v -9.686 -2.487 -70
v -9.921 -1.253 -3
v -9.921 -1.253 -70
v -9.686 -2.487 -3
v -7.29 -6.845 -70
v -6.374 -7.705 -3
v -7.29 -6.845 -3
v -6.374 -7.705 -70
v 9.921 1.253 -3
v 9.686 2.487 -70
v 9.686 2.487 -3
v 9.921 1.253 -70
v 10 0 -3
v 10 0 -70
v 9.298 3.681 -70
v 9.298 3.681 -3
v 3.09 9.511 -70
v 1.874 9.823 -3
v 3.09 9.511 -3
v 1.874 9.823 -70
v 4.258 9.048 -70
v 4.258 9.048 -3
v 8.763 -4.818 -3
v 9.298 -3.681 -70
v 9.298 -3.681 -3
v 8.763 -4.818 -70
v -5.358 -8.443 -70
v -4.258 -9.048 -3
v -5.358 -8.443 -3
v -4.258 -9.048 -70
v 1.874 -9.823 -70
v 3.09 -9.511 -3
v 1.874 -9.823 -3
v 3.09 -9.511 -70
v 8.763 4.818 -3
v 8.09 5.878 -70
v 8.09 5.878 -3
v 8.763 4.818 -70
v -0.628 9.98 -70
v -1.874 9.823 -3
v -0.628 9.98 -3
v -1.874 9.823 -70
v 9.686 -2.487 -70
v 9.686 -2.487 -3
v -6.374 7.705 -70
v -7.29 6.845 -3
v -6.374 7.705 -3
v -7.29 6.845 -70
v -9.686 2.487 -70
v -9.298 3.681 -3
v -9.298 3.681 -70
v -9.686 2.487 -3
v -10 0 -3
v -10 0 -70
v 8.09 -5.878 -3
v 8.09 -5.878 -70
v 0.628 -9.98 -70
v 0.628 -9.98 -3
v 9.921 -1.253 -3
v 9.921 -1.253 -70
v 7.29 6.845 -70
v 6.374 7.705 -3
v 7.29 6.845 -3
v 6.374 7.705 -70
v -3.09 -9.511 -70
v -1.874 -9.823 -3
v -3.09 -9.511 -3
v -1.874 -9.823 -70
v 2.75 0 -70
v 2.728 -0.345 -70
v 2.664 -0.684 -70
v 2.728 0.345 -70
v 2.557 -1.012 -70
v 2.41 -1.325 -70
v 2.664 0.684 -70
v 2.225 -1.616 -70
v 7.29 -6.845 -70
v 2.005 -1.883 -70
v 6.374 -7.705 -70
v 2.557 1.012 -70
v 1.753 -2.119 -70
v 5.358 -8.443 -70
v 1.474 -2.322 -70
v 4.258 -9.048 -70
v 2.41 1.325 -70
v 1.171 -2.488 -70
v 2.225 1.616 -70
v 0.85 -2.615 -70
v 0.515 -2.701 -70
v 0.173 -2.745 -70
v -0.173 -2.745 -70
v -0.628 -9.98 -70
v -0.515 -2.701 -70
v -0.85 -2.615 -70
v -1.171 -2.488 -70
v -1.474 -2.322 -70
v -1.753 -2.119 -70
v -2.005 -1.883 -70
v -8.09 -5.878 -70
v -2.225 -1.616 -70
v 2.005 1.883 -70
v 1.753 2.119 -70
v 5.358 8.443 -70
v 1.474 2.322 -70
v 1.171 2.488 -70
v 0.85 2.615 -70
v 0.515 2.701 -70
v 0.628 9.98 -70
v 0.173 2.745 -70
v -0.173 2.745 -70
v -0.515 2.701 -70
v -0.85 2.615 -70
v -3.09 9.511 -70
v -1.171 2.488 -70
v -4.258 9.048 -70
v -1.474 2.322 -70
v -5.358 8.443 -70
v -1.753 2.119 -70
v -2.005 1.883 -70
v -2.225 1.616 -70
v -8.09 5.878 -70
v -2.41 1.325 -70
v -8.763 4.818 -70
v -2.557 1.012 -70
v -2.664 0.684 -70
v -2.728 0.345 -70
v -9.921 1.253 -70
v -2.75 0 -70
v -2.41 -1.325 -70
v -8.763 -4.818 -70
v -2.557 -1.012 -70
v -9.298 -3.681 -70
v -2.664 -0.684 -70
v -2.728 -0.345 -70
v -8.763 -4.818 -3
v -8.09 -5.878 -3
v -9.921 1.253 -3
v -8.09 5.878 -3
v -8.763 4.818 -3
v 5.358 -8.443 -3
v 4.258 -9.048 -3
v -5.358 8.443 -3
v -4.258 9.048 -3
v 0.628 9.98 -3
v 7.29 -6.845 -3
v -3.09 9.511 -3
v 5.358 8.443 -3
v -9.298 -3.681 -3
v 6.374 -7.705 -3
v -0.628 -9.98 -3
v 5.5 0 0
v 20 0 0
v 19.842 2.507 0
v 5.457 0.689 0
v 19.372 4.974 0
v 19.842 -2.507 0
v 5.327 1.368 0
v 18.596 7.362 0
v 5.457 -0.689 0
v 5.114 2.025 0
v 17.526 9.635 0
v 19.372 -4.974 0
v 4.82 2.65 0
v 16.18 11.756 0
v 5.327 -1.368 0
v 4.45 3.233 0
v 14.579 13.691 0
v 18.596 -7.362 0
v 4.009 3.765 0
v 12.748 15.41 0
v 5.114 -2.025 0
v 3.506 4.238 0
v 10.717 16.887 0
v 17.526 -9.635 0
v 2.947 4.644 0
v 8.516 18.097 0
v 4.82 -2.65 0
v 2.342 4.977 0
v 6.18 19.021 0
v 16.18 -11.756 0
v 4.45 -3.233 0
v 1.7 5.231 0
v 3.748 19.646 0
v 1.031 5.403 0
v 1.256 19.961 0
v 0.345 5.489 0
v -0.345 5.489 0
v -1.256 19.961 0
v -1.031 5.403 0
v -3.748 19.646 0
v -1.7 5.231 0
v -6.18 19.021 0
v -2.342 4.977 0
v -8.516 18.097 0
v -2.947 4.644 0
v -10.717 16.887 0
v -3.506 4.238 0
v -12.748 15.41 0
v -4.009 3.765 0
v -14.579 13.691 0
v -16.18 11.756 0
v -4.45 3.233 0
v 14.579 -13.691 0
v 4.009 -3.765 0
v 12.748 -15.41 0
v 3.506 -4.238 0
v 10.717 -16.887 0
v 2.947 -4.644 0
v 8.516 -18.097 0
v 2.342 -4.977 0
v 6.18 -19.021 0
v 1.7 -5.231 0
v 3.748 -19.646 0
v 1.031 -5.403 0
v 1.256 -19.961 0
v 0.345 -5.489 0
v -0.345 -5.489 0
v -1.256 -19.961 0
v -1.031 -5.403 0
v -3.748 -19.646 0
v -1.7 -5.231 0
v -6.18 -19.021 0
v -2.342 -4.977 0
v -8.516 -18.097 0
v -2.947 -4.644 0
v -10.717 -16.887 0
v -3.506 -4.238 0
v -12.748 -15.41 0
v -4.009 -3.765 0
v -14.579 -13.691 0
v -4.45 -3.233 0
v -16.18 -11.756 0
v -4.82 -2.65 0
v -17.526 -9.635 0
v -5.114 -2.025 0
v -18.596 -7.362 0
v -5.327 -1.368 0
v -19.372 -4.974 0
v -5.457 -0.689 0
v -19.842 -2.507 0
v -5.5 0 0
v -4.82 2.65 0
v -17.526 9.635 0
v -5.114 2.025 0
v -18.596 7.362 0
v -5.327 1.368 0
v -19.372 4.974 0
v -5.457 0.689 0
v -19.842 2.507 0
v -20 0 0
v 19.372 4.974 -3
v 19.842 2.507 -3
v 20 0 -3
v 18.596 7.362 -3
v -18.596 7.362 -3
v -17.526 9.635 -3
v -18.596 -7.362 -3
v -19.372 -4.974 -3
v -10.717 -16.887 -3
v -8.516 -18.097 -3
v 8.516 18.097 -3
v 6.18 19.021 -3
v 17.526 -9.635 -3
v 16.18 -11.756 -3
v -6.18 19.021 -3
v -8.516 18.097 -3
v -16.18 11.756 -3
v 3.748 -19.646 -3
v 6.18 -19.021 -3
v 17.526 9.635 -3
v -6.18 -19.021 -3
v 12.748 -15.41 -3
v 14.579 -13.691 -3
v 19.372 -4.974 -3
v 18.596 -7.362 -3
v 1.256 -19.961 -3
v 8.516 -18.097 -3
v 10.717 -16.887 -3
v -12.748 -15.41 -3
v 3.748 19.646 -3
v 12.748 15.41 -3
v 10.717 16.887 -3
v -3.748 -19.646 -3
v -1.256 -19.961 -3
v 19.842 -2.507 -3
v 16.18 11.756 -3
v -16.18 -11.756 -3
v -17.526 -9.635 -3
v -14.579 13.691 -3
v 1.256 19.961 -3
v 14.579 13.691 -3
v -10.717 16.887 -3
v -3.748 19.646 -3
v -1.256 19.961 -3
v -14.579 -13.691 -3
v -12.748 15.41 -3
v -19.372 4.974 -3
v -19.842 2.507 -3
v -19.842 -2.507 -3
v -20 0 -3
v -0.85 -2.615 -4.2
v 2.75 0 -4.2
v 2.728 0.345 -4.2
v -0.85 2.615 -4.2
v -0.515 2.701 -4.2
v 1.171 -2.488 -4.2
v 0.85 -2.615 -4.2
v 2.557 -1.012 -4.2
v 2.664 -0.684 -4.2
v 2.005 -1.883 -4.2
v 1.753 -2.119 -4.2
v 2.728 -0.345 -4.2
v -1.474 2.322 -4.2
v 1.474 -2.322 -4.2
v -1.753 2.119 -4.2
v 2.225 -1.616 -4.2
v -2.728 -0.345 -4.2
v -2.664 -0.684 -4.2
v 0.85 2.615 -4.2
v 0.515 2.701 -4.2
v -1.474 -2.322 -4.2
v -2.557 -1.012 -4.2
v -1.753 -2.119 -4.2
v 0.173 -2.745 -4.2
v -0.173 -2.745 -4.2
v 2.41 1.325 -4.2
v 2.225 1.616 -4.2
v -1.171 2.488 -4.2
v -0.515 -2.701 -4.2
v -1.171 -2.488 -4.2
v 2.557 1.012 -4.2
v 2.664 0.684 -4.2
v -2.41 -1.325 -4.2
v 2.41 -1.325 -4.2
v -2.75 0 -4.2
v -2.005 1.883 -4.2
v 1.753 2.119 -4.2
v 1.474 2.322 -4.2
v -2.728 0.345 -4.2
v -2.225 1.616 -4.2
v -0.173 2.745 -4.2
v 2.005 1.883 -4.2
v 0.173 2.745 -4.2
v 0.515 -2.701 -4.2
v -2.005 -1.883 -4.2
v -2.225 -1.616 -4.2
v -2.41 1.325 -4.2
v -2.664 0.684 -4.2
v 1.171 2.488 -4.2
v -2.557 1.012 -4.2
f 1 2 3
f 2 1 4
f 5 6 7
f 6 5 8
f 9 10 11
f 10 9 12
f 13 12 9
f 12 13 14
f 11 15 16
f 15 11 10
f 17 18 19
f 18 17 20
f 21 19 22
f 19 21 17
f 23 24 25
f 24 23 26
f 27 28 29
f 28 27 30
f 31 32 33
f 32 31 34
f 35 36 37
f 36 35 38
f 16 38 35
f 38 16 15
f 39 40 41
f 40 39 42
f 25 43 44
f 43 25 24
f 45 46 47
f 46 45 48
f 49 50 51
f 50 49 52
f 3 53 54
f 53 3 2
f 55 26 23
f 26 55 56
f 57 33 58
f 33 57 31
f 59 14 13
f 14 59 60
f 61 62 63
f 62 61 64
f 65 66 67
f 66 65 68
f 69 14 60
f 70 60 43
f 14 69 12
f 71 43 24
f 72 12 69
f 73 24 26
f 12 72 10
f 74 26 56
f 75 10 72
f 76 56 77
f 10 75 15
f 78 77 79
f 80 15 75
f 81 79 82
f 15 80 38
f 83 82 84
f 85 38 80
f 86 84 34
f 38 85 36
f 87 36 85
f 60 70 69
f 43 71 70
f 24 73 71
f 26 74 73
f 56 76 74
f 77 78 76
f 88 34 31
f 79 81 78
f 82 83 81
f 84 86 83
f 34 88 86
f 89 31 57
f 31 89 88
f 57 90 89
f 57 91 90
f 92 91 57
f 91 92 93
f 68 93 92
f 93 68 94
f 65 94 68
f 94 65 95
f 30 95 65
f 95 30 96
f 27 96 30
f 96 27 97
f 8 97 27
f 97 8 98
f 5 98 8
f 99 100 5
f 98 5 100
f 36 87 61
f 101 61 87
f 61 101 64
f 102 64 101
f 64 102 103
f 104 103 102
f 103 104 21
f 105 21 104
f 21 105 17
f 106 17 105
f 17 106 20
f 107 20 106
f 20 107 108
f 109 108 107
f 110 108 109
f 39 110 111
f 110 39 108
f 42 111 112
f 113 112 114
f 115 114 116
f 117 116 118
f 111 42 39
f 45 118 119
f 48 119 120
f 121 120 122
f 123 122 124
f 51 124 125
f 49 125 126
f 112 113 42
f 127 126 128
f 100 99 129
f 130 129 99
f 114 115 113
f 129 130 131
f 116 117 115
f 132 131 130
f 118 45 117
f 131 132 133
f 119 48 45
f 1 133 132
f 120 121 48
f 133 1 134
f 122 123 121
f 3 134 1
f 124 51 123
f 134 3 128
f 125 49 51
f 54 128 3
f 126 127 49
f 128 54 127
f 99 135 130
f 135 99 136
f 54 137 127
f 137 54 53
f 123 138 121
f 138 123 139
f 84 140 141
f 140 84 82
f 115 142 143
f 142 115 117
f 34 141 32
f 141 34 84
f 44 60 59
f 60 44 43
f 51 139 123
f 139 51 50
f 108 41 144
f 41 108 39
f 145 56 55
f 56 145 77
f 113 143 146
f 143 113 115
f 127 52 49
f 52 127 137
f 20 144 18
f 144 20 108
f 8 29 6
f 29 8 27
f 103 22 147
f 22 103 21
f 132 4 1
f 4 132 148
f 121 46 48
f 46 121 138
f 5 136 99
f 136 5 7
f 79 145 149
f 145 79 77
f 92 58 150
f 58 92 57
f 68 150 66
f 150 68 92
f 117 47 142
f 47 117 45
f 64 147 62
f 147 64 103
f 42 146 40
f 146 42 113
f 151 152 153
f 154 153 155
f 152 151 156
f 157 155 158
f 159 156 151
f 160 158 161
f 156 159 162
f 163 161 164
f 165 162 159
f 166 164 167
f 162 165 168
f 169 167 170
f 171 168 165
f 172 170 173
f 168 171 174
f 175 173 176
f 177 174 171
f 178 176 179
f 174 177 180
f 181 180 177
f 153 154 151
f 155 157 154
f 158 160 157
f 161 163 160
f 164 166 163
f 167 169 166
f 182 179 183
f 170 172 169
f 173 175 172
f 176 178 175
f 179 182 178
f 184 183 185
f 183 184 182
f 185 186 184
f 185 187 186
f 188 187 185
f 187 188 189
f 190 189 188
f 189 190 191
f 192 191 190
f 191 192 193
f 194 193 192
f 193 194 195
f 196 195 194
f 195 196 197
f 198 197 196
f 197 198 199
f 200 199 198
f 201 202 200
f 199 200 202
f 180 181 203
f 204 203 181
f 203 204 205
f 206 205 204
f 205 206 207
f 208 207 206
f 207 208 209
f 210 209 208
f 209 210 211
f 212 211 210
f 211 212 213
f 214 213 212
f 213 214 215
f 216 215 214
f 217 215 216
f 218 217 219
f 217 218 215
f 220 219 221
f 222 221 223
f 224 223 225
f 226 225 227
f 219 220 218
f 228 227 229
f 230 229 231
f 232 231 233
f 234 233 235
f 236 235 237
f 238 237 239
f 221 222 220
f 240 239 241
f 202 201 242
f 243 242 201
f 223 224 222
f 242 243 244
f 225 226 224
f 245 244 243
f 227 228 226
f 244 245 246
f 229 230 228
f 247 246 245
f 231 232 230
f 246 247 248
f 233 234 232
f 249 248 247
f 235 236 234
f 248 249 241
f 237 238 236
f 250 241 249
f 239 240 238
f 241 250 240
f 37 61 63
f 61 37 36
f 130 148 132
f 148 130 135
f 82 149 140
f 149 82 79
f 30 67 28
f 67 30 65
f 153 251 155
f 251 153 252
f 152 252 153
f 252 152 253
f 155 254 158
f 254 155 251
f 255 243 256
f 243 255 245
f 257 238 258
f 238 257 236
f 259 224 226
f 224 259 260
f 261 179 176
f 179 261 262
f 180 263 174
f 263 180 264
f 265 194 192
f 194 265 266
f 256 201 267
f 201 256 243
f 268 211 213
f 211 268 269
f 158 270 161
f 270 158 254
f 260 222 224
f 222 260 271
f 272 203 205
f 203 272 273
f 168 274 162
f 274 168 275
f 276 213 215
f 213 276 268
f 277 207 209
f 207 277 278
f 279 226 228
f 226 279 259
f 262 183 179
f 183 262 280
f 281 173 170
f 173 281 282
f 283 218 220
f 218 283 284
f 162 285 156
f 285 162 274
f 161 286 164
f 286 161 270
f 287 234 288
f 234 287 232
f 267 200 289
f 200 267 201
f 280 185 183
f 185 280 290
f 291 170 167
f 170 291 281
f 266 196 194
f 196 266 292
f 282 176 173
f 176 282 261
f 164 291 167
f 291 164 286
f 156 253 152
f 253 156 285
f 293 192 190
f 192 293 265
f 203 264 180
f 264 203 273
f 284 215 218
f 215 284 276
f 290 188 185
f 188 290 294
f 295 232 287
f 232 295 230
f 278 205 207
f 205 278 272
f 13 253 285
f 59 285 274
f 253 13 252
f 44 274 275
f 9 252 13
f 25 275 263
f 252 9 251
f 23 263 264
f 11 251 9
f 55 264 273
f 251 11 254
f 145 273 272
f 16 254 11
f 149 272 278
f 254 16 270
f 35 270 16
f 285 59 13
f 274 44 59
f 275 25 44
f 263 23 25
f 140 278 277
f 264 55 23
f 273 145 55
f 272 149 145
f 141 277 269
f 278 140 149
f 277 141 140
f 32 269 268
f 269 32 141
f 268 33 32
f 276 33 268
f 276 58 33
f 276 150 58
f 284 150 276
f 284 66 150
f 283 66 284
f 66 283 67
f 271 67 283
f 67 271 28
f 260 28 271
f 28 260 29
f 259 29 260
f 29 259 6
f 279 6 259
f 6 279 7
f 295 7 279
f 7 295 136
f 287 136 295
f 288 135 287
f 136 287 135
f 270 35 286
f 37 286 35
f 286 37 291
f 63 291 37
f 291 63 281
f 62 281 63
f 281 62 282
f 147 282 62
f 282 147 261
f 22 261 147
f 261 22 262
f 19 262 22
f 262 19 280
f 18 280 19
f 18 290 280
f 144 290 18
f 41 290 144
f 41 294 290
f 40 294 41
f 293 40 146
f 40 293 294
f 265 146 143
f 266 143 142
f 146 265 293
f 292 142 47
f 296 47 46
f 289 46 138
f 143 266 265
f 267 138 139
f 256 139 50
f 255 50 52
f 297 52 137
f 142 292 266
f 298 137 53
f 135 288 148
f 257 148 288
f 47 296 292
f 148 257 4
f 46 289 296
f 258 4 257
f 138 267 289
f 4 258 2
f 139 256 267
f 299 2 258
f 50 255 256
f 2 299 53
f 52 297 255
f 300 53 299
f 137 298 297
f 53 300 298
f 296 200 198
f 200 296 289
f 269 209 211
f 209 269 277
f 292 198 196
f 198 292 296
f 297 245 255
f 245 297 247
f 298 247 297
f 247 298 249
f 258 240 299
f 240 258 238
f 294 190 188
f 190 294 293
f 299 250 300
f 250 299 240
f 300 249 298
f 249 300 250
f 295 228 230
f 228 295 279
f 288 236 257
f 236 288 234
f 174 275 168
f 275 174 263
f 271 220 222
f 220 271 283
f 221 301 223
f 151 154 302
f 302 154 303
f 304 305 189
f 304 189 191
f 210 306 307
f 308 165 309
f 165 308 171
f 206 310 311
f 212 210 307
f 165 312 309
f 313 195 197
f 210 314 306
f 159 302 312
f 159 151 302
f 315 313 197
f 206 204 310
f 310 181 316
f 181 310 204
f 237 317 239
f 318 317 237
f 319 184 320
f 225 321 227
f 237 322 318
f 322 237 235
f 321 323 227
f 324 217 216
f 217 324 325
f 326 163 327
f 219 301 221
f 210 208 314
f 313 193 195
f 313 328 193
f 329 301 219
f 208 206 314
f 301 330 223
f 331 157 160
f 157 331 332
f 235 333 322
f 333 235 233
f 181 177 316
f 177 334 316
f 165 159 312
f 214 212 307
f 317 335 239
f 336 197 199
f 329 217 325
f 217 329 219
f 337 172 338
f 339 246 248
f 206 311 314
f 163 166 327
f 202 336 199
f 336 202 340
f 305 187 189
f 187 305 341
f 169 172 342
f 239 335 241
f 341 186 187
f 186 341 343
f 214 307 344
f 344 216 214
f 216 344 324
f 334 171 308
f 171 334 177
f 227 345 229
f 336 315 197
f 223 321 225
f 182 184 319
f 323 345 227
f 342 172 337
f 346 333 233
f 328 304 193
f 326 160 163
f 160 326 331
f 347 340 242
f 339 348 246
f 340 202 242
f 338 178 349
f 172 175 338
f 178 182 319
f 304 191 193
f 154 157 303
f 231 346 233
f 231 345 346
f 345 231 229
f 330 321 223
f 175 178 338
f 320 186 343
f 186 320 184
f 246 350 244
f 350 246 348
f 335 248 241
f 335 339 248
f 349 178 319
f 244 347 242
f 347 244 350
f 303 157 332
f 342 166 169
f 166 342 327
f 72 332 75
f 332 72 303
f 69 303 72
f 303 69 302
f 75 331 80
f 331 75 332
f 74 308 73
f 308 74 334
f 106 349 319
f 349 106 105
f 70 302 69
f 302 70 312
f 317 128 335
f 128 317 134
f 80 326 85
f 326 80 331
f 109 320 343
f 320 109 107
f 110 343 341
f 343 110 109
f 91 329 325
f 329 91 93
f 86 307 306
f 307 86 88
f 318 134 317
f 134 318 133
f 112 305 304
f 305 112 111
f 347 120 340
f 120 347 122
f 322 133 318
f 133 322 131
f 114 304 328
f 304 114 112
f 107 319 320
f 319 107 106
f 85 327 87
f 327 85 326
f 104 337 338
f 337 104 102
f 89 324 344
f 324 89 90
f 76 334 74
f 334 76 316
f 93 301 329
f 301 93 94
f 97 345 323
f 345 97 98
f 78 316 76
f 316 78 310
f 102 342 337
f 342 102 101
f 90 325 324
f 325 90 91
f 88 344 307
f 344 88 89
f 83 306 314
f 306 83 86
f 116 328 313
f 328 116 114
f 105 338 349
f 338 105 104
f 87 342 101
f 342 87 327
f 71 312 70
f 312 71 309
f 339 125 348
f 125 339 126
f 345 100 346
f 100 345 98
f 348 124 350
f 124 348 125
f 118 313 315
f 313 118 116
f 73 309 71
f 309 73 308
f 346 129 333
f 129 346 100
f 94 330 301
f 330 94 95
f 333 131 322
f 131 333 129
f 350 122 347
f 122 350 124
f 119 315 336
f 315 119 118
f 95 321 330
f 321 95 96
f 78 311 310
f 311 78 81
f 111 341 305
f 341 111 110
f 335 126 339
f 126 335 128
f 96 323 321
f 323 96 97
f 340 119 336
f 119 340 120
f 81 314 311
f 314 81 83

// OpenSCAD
$fn = 50;


difference() {
	union() {
		translate(v = [0, 0, -70.0000000000]) {
			cylinder(h = 70, r = 10.0000000000);
		}
		translate(v = [0, 0, -3.0000000000]) {
			cylinder(h = 3, r = 20.0000000000);
		}
	}
	union() {
		translate(v = [0, 0, 0]) {
			rotate(a = [0, 0, 0]) {
				difference() {
					union() {
						#translate(v = [0, 0, -70.0000000000]) {
							cylinder(h = 70, r = 2.2500000000);
						}
						#translate(v = [0, 0, -4.2000000000]) {
							cylinder(h = 4.2000000000, r = 10.0000000000, r1 = 2.7500000000, r2 = 5.5000000000);
						}
						#translate(v = [0, 0, -70.0000000000]) {
							cylinder(h = 70, r = 2.7500000000);
						}
						#translate(v = [0, 0, -70.0000000000]) {
							cylinder(h = 70, r = 2.2500000000);
						}
					}
					union();
				}
			}
		}
	}
}
